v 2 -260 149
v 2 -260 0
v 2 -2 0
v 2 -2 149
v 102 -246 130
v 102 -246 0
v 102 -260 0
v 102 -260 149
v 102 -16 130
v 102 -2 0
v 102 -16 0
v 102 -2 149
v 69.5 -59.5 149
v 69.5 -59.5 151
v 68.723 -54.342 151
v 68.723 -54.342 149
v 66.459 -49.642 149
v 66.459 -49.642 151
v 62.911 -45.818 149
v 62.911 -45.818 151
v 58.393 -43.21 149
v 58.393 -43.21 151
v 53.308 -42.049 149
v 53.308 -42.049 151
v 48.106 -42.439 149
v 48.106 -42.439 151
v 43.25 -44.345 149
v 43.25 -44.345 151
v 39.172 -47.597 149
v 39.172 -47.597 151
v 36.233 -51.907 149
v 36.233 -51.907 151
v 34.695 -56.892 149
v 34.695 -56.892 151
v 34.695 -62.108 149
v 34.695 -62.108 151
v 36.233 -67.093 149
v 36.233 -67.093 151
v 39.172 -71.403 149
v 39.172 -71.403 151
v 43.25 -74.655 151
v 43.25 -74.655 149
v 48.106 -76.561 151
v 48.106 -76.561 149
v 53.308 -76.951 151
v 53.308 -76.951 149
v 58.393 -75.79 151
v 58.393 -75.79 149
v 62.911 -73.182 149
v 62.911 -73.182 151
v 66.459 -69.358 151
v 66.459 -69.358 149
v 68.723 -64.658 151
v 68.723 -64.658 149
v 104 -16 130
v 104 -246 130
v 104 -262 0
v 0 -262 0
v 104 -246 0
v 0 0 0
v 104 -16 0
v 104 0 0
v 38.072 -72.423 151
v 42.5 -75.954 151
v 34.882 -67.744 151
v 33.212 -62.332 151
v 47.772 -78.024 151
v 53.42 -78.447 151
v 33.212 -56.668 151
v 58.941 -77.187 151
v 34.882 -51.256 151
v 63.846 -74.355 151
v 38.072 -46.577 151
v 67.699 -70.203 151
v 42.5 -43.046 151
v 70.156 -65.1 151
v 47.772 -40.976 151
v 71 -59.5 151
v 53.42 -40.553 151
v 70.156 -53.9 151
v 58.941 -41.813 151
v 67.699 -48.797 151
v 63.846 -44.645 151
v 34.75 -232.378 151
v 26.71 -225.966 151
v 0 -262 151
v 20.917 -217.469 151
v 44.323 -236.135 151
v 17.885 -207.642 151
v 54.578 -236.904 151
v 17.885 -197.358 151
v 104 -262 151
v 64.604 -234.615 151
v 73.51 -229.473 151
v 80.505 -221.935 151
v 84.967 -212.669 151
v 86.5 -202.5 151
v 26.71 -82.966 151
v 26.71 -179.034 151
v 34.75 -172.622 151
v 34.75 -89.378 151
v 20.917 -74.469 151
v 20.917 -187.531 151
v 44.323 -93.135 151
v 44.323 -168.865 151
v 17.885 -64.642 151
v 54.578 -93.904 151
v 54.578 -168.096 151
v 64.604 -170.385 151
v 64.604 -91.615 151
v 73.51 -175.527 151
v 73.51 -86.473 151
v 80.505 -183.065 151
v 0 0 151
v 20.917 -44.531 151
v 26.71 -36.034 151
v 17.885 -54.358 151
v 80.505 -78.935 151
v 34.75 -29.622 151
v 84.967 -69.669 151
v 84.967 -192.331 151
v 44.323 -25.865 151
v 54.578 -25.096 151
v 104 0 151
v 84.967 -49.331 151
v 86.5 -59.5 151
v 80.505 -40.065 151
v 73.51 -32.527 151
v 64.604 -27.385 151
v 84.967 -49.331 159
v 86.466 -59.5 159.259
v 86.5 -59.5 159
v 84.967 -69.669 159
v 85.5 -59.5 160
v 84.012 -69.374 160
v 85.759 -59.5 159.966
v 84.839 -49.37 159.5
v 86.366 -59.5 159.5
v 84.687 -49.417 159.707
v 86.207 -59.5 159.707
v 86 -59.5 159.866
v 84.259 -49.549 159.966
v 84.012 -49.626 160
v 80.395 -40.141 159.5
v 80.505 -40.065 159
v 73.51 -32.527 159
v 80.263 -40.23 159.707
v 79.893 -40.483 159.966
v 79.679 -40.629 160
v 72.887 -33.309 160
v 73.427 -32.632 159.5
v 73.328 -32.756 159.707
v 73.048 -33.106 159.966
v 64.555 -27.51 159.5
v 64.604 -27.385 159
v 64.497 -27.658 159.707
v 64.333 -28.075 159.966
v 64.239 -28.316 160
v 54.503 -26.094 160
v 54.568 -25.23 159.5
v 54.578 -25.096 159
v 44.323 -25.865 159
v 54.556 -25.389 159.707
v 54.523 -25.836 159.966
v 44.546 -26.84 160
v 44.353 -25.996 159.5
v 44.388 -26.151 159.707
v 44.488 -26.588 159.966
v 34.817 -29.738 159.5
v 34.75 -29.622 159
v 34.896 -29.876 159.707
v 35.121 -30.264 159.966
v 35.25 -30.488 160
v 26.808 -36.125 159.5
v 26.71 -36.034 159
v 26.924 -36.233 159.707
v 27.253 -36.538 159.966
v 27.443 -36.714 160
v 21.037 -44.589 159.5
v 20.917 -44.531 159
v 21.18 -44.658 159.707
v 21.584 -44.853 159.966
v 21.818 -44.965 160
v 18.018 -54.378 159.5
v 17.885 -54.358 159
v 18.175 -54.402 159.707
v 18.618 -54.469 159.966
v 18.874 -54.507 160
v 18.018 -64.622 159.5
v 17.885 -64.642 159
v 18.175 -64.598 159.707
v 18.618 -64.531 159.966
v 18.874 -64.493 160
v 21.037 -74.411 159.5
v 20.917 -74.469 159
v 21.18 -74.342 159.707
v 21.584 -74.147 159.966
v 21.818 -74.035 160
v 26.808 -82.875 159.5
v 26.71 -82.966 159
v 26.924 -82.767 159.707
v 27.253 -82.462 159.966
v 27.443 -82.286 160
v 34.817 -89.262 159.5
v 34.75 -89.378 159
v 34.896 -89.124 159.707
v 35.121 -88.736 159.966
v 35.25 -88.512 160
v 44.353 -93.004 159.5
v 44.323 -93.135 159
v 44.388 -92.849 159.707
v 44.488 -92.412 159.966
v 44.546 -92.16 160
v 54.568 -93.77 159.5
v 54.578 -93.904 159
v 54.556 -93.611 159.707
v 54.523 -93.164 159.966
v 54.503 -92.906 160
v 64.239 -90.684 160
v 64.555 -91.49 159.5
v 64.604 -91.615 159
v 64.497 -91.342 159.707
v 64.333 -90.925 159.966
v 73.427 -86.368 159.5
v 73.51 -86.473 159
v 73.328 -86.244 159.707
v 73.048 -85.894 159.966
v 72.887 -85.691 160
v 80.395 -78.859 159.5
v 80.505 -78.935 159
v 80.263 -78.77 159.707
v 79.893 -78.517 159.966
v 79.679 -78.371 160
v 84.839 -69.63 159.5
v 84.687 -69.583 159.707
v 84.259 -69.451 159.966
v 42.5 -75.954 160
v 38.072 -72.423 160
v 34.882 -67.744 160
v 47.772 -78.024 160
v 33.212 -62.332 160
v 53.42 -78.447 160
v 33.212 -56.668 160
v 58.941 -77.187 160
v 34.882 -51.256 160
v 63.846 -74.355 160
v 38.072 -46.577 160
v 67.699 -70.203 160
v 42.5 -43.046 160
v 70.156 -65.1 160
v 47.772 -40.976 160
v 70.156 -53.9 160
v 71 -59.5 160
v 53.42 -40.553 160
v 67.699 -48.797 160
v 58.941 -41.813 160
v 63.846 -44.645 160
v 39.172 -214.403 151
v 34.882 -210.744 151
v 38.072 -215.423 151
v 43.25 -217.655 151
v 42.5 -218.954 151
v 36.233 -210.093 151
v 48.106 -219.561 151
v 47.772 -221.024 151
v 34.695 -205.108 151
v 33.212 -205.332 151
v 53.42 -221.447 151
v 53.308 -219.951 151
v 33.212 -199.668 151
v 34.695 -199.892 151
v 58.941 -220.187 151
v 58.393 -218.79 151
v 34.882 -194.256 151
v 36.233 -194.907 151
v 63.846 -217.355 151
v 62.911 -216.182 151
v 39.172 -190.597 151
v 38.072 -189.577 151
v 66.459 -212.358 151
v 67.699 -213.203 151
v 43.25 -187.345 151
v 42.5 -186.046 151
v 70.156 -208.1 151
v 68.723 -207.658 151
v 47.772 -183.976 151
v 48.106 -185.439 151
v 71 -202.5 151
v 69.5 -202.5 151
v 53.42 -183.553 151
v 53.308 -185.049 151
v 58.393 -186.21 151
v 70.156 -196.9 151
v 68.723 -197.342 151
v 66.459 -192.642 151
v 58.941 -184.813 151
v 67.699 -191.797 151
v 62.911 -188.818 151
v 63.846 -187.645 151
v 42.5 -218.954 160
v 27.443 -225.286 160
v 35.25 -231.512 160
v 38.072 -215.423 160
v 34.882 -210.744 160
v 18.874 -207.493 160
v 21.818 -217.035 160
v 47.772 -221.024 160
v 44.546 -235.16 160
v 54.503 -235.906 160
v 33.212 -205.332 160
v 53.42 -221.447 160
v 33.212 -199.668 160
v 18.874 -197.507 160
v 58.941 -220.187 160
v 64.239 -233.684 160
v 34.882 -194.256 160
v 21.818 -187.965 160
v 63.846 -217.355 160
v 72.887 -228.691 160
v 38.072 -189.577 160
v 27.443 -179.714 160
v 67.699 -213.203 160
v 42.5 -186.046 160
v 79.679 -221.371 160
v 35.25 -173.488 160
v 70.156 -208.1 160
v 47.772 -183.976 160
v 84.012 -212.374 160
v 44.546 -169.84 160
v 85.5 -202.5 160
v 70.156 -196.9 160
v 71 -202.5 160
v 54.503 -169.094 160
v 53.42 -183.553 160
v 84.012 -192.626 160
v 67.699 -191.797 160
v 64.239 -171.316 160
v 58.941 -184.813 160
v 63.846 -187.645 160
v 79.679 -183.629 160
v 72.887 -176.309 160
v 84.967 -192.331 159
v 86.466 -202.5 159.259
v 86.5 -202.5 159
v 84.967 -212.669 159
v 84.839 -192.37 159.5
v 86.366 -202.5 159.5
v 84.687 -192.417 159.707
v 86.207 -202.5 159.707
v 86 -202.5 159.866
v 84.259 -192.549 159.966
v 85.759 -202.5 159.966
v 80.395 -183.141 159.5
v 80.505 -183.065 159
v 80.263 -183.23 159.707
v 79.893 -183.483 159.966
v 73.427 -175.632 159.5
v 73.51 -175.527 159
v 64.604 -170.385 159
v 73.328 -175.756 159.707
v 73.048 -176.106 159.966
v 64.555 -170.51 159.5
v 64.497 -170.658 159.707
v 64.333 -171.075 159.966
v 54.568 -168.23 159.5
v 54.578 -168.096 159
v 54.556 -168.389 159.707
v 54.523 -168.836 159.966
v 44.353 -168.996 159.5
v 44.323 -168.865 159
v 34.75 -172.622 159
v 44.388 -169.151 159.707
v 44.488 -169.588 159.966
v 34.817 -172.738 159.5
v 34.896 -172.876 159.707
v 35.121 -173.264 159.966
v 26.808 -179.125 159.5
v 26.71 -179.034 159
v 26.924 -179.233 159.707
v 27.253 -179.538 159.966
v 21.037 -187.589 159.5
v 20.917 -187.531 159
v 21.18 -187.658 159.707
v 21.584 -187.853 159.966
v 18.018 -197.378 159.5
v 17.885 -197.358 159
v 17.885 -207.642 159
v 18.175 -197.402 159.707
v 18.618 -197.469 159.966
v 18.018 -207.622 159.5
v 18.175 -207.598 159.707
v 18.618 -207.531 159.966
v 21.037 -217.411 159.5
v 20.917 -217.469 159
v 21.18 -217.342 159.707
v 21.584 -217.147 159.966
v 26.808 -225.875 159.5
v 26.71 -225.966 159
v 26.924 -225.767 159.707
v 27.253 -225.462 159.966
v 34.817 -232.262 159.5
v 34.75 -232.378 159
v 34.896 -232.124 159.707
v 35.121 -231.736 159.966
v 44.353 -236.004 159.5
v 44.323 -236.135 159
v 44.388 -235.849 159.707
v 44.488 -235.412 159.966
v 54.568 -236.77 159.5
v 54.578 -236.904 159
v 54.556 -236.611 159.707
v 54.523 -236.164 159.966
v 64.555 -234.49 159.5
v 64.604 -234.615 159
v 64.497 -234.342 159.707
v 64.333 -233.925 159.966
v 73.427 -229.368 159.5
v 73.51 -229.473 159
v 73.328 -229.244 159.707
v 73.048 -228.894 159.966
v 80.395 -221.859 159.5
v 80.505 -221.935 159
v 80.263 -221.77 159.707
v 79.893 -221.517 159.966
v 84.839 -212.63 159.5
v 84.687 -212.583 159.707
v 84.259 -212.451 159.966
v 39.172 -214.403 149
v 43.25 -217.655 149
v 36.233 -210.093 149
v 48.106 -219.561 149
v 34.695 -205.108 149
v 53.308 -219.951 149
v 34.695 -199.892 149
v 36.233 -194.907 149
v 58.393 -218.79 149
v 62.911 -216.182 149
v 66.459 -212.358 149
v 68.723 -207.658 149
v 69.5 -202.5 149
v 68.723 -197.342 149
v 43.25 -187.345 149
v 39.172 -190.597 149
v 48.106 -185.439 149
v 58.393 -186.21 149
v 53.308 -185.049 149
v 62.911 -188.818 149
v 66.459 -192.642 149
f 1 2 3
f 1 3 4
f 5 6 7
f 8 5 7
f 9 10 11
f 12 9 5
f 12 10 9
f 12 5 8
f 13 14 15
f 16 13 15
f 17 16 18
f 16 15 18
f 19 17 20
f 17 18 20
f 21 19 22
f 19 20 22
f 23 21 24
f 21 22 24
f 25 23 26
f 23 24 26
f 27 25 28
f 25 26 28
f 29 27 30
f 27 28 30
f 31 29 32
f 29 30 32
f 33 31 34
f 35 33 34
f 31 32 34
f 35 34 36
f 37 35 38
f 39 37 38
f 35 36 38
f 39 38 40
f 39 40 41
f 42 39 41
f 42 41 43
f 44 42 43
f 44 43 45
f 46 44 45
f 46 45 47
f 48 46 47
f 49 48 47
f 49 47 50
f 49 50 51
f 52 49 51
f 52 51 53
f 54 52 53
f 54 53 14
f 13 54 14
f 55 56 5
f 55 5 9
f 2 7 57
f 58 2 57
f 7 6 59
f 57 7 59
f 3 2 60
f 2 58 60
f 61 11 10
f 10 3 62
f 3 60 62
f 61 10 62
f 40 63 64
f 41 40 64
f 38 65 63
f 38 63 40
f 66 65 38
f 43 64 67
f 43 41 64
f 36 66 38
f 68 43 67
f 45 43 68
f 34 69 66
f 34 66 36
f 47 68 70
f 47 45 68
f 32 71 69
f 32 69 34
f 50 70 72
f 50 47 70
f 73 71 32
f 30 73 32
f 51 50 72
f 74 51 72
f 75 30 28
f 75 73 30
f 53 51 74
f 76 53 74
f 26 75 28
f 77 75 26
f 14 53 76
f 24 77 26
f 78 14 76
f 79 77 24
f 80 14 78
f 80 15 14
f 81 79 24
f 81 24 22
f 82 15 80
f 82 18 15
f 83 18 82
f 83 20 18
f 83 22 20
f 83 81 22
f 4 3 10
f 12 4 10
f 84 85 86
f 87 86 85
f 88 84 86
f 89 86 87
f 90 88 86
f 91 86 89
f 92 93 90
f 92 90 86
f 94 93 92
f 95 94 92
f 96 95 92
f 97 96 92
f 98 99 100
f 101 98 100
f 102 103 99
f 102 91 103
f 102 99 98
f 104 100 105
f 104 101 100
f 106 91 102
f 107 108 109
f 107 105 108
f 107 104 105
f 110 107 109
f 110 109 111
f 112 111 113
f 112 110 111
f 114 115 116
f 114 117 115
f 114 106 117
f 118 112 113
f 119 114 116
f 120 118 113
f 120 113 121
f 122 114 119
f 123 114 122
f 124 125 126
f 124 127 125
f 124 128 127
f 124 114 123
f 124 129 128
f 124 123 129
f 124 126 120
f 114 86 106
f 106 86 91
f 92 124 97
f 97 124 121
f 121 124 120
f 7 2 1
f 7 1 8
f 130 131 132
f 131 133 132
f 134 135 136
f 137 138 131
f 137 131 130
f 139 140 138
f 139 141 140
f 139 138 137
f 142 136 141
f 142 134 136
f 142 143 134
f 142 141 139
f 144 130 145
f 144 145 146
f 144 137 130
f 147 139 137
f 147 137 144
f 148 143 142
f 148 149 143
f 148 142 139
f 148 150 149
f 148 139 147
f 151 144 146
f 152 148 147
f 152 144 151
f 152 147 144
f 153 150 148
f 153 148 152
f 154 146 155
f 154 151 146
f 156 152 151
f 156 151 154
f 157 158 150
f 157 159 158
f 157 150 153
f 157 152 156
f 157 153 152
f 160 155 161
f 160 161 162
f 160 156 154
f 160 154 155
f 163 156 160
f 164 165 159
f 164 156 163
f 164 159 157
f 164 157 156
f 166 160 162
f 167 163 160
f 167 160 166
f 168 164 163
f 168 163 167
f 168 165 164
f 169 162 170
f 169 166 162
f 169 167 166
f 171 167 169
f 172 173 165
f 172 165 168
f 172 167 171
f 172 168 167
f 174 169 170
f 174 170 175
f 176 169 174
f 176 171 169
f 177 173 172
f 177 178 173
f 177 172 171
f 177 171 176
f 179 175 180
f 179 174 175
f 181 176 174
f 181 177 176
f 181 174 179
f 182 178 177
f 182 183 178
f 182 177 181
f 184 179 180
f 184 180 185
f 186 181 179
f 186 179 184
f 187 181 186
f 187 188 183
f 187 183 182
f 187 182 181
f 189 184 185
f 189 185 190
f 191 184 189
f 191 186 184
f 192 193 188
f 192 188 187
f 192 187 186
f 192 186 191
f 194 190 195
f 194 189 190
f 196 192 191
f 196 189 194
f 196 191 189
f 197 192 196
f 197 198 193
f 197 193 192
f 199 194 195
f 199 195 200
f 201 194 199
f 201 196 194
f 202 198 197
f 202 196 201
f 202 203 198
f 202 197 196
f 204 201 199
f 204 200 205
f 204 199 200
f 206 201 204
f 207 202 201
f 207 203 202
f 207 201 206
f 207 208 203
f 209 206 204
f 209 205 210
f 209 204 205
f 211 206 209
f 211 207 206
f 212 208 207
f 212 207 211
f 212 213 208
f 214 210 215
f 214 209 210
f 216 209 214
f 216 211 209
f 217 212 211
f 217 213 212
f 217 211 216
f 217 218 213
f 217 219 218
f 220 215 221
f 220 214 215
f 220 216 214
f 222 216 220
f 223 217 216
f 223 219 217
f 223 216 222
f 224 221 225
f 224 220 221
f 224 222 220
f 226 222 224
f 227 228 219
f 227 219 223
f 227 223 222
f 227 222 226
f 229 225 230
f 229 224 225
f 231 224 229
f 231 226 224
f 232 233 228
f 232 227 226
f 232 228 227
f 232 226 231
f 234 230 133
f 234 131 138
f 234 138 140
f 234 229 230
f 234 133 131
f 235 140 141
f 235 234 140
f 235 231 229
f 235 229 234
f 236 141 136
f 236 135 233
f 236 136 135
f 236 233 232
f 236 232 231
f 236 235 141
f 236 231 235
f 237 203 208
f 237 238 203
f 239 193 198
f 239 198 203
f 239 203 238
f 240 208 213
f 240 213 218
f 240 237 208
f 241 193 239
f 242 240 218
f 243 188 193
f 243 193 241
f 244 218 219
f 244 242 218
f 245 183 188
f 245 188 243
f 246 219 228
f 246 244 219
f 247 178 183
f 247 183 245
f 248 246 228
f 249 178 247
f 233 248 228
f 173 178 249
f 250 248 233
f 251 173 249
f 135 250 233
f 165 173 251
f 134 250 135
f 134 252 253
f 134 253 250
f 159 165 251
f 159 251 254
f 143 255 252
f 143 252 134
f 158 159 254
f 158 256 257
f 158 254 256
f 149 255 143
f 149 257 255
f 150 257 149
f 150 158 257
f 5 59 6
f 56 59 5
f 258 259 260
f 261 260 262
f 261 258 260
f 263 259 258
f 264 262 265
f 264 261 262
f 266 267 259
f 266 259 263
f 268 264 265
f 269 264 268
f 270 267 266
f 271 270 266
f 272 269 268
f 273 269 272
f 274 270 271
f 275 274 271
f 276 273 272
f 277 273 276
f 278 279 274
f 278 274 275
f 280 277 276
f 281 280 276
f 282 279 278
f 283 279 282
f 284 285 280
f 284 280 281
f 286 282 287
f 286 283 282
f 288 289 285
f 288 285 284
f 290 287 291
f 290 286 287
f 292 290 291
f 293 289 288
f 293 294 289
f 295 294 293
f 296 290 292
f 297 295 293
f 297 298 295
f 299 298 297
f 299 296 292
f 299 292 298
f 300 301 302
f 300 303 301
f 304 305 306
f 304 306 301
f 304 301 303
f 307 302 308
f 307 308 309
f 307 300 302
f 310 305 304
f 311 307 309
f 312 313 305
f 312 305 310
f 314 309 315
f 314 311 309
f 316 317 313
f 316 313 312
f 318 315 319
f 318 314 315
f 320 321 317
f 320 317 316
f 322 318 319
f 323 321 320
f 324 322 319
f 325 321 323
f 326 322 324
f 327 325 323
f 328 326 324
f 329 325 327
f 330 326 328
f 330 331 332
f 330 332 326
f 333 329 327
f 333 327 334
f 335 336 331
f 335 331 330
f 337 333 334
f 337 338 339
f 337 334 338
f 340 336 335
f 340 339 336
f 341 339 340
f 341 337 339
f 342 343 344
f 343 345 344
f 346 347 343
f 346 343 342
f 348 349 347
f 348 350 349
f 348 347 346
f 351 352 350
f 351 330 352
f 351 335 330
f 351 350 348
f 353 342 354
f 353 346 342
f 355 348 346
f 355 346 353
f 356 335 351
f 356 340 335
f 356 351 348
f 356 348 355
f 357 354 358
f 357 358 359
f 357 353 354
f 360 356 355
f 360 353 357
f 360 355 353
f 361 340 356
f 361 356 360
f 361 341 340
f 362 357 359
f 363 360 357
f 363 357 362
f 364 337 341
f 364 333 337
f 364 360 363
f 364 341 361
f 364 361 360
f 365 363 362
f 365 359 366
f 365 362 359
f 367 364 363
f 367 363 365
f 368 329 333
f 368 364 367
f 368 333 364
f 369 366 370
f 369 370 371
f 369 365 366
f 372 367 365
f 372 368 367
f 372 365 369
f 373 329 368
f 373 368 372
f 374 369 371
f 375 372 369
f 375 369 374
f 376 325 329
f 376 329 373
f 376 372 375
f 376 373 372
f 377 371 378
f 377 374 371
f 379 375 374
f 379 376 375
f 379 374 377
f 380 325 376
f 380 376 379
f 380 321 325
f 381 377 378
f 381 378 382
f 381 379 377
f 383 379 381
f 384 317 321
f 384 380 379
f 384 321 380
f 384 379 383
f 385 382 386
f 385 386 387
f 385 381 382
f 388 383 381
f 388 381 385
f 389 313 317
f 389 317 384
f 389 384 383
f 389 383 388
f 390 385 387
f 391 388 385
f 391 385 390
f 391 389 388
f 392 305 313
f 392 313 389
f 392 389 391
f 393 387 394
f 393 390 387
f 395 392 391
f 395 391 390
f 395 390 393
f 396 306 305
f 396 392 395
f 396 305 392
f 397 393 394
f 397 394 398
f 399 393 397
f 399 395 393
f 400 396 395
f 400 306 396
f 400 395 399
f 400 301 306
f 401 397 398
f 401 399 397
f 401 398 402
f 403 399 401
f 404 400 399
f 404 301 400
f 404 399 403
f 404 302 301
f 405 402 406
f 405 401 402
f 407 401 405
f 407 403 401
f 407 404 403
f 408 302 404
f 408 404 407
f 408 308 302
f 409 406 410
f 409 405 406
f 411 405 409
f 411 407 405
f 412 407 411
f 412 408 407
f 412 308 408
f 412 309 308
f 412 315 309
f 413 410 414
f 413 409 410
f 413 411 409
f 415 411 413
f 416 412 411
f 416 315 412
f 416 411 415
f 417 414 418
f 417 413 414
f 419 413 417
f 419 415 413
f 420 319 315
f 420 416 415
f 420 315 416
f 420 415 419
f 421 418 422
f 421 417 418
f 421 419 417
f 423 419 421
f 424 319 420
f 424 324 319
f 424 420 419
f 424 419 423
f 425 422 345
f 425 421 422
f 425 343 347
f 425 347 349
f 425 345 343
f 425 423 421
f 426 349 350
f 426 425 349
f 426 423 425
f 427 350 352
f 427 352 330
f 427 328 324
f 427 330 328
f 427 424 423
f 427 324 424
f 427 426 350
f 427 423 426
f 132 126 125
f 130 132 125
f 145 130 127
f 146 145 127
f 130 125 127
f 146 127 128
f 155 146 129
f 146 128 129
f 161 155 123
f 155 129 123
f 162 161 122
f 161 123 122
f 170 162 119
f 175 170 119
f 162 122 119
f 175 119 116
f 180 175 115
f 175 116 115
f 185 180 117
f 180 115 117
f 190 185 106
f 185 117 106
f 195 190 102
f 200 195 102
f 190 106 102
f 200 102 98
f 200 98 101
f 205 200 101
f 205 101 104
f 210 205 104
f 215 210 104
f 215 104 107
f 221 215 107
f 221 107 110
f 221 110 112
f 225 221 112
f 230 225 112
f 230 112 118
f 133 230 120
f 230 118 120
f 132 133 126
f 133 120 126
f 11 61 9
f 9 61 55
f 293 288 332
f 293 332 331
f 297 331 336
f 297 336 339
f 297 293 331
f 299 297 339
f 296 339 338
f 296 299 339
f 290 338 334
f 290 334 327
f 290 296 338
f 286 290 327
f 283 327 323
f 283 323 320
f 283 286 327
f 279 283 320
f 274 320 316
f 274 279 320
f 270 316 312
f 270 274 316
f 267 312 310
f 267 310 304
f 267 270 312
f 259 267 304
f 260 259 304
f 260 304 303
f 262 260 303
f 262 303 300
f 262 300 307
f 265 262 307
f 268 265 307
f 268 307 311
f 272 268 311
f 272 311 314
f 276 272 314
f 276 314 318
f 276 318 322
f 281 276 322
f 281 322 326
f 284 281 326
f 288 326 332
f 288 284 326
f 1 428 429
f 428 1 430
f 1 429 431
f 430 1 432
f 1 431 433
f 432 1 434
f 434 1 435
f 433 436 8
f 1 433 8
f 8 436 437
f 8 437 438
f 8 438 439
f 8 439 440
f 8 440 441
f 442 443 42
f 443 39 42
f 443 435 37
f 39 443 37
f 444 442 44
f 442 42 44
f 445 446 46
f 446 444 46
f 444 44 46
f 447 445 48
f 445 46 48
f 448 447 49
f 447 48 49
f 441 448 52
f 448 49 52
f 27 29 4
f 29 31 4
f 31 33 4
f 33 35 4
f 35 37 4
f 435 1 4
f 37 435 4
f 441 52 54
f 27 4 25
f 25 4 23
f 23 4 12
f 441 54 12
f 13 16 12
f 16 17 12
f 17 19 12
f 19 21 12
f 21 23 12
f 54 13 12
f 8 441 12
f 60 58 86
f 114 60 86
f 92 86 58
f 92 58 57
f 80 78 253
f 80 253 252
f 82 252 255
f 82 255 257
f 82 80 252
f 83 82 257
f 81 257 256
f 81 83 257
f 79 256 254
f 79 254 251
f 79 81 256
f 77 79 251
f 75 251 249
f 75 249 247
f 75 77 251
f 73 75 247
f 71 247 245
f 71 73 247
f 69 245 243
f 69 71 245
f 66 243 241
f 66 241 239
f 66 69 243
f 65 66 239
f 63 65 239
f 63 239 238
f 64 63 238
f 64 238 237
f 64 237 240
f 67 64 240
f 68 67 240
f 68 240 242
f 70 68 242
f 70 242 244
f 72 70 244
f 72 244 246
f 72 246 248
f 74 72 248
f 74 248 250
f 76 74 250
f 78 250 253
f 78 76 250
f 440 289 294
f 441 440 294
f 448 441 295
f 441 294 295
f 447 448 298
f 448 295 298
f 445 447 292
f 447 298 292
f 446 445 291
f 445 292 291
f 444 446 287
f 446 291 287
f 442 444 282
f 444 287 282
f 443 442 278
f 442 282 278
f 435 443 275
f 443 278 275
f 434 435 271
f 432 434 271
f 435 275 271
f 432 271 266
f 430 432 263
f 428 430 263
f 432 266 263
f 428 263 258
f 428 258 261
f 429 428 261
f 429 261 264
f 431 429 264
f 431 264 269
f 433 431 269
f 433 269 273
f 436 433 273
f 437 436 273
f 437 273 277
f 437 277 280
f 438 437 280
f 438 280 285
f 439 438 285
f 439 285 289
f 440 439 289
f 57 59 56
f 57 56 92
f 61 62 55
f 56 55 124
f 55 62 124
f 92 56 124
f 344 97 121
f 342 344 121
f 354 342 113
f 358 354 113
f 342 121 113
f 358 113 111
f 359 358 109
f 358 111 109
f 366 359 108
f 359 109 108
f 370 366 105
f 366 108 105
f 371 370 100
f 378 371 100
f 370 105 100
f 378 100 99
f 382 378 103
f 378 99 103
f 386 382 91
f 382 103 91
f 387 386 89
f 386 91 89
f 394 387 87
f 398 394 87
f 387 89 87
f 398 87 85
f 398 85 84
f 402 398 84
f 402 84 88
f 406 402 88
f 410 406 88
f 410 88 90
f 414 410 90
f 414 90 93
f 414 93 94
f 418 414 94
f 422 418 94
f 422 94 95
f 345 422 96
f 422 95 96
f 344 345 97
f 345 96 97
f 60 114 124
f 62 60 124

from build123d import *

# Parameters (mm, degrees)
F0_W     = 104
F0_H     = 151
F1_DEPTH = 262
F2_T     = -2
F3_W     = 230
F3_H     = 130
F4_DEPTH = 2
F5_R     = 17.5
F6_DEPTH = 25
F7_R     = 34.5
F7_R_2   = 19
F8_DEPTH = 9
F9_R     = 1


with BuildPart() as f1:
    # F0 (on Front) → F1 (new body)
    with BuildSketch(Plane.XZ):
        with Locations((52, 75.5)):
            Rectangle(F0_W, F0_H)
    extrude(amount=F1_DEPTH)

    # F2
    f2_openings = [f1.faces().sort_by_distance(p)[0] for p in [
        (52, -131, 0),
    ]]
    offset(amount=F2_T, openings=f2_openings)

    # F3 (on face) → F4 (cut, through all)
    with BuildSketch(Plane.YZ.offset(104)):
        with Locations((-131, 65)):
            Rectangle(F3_W, F3_H)
    extrude(amount=-F4_DEPTH, mode=Mode.SUBTRACT)

    # F5 (on face) → F6 (cut)
    with BuildSketch(Plane.XY.offset(151)):
        with Locations((52, -59.5)):
            Circle(F5_R)
        with Locations((52, -202.5)):
            Circle(F5_R)
    extrude(amount=-F6_DEPTH, mode=Mode.SUBTRACT)

    # F7 (on face) → F8 (join)
    with BuildSketch(Plane.XY.offset(151)):
        with Locations((52, -59.5)):
            Circle(F7_R)
        with Locations((52, -59.5)):
            Circle(F7_R_2, mode=Mode.SUBTRACT)
        with Locations((52, -202.5)):
            Circle(F7_R)
        with Locations((52, -202.5)):
            Circle(F7_R_2, mode=Mode.SUBTRACT)
    extrude(amount=F8_DEPTH)

    # F9
    f9_edges = [f1.edges().sort_by_distance(p)[0] for p in [
        (17.5, -59.5, 160),
        (17.5, -202.5, 160),
    ]]
    fillet(f9_edges, radius=F9_R)


solid = f1.part
